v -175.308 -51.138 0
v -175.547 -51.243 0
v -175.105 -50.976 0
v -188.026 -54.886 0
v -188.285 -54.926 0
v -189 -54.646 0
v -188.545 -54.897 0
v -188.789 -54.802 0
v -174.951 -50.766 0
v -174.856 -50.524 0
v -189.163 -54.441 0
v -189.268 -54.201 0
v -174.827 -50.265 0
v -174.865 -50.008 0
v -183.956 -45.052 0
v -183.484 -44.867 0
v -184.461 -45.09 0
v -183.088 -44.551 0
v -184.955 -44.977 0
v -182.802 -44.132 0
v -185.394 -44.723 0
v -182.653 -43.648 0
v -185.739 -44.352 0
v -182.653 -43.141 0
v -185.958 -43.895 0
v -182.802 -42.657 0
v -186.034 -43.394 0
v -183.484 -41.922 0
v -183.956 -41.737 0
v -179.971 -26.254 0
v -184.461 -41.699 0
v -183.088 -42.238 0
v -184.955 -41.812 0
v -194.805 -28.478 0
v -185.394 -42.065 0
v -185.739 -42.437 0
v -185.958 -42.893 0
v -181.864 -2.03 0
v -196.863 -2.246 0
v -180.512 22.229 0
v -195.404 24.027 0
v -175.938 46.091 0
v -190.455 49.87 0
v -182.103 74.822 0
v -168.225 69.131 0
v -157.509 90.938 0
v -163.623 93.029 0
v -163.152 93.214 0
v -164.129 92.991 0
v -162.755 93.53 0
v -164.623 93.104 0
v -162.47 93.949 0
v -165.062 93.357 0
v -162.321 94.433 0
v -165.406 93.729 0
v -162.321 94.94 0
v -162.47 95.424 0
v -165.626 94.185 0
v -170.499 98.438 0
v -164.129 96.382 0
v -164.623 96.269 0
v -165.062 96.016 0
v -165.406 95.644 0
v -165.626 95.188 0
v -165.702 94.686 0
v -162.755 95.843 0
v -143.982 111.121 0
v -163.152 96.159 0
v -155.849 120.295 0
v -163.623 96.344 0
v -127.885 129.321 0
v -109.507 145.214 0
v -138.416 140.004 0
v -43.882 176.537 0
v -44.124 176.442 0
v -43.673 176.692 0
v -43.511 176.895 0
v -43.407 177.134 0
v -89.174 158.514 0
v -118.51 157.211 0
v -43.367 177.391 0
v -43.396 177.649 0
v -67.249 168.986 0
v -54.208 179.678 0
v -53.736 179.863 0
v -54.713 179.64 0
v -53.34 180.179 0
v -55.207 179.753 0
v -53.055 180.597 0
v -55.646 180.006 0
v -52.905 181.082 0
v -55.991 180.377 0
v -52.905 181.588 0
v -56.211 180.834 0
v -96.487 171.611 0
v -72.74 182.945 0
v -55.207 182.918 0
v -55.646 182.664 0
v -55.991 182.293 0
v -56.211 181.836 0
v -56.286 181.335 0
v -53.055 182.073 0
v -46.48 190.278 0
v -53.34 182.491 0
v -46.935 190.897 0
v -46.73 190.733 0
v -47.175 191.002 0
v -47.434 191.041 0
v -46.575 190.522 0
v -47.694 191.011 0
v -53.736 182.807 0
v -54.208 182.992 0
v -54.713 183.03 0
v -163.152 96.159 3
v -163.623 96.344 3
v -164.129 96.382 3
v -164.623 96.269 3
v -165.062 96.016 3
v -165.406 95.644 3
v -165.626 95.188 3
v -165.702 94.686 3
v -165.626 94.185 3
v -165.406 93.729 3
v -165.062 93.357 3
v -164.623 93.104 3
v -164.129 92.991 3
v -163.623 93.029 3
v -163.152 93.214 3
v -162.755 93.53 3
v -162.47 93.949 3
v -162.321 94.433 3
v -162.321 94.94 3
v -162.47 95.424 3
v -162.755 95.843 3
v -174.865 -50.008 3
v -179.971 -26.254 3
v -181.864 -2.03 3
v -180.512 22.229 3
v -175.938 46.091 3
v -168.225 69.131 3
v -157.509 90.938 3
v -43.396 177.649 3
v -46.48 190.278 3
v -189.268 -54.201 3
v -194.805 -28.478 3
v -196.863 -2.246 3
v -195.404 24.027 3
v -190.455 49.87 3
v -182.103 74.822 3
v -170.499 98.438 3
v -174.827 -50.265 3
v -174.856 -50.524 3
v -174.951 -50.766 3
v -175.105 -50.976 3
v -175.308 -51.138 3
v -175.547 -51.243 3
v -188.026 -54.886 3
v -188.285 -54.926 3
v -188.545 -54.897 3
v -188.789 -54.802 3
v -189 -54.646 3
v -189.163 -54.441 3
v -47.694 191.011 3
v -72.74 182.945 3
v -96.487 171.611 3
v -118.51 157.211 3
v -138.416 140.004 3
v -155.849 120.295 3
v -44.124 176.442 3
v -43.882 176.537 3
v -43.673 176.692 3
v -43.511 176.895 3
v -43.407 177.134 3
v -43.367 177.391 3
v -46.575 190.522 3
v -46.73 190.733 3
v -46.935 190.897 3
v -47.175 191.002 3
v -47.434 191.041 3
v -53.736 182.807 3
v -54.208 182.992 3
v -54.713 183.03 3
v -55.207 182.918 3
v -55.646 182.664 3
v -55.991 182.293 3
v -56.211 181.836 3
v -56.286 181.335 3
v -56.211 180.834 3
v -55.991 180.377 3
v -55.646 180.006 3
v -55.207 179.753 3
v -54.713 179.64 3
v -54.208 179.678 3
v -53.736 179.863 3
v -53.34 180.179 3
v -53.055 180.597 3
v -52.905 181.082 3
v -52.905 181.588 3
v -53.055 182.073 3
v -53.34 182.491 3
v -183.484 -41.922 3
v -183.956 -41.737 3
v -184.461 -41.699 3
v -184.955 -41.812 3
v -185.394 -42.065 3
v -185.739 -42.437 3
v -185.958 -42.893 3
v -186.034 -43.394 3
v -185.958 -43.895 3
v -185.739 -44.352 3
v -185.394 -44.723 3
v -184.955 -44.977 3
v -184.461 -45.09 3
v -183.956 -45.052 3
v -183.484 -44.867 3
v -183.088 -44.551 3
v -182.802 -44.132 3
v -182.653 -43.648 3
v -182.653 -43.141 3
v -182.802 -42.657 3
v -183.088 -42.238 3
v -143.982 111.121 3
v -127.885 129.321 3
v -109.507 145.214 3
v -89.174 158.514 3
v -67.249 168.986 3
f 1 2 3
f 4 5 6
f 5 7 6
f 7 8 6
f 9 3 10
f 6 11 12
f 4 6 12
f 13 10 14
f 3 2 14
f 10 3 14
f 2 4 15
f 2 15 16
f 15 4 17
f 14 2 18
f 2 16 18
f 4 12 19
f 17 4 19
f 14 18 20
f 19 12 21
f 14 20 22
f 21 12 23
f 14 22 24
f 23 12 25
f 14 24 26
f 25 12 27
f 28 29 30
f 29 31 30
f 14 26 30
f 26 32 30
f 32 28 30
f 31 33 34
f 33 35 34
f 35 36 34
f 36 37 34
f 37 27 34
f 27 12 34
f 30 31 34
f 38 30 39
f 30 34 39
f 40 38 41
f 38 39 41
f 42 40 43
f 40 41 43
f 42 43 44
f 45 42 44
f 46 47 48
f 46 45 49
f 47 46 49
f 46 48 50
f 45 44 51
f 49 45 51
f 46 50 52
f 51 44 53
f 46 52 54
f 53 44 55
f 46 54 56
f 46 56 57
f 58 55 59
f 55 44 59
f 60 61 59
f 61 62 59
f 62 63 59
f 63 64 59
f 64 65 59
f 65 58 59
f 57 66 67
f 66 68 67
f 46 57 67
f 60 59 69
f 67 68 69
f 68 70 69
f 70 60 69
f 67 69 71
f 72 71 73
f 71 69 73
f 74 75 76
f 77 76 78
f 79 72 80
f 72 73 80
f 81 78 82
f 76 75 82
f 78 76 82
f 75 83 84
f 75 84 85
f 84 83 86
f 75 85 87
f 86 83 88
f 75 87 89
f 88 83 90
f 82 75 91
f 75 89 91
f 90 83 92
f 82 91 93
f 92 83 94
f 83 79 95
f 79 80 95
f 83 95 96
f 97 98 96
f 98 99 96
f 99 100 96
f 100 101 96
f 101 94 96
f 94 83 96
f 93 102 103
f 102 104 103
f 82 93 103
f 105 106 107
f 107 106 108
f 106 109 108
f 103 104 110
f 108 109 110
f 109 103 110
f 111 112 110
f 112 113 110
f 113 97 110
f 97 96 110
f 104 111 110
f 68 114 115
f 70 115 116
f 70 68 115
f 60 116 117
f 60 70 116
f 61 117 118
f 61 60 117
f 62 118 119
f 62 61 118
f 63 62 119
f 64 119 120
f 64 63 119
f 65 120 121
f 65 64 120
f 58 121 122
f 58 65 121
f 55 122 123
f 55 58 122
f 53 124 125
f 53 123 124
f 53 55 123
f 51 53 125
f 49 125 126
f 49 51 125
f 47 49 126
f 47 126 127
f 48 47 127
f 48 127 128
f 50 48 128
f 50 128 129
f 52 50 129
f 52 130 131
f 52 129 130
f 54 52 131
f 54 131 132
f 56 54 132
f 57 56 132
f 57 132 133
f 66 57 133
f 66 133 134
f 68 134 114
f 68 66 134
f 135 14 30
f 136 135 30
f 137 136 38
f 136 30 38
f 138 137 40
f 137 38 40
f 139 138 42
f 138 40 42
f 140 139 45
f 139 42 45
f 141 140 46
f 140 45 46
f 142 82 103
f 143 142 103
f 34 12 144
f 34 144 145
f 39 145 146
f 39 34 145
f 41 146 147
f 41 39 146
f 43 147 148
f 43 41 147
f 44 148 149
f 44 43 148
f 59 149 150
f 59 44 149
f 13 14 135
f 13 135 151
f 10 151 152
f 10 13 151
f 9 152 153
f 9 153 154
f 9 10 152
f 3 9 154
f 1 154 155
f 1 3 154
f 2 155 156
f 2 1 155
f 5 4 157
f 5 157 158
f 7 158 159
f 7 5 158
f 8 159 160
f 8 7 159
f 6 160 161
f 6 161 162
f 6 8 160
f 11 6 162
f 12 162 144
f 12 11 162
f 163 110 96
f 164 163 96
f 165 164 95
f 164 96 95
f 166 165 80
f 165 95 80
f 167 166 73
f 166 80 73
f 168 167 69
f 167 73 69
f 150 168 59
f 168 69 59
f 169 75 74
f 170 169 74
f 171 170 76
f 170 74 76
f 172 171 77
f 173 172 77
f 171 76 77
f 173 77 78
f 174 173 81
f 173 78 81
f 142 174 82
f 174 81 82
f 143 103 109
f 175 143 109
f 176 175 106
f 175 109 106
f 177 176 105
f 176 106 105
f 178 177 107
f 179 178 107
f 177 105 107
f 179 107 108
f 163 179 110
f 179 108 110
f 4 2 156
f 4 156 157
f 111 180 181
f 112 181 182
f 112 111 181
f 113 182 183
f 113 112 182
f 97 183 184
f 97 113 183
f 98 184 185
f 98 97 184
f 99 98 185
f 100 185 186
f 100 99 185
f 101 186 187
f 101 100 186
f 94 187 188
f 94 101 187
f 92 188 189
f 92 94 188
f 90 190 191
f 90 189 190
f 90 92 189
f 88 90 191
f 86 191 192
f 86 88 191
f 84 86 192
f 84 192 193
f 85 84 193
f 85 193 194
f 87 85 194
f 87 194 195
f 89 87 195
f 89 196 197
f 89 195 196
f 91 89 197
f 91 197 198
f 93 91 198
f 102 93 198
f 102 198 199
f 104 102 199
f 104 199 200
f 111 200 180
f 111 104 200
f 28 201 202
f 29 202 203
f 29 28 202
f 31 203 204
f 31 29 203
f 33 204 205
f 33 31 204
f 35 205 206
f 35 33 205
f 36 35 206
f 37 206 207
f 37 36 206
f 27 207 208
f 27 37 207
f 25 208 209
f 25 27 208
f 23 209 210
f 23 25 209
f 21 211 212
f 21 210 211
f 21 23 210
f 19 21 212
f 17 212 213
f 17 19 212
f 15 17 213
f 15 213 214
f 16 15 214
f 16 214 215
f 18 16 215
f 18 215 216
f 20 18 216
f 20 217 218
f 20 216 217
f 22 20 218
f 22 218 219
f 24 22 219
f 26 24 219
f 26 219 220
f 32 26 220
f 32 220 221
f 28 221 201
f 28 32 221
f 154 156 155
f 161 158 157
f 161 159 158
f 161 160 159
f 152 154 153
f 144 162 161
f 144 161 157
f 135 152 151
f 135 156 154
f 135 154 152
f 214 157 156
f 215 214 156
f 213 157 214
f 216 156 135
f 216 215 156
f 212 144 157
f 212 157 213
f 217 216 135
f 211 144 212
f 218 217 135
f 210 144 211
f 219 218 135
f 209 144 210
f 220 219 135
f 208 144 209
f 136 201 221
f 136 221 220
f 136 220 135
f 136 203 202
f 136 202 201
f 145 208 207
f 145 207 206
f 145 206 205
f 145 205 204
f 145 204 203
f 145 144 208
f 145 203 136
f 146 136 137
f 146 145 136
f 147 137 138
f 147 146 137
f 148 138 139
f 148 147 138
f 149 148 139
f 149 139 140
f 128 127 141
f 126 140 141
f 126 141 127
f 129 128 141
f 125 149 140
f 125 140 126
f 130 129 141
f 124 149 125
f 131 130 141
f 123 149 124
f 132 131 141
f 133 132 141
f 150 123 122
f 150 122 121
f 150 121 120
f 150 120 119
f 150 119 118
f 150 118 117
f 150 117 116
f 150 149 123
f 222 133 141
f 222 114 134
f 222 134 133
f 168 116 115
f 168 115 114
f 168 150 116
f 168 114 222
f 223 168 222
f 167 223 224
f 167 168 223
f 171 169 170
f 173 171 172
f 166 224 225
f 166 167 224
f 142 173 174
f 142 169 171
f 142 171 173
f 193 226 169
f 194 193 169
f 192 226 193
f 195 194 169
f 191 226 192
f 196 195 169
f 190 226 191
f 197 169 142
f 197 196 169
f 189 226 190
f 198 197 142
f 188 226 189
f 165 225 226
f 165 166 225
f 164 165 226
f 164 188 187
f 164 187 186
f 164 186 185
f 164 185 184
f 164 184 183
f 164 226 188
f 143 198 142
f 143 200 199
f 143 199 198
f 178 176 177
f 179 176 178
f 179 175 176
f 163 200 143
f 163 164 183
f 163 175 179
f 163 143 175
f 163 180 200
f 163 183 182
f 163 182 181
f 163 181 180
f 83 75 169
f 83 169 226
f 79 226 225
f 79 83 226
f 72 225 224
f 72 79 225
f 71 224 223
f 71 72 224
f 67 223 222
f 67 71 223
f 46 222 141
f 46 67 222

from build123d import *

# Parameters (mm, degrees)
PAD015_DEPTH                        = 3
SKETCH054_R                         = 1.7
POCKET018_DEPTH                     = 0.001
POCKET018_DEPTH_BACK                = 3.001
BODY001003005003004_PLACEMENT_ANGLE = 60


with BuildPart() as part:
    # Sketch053 → Pad015 (new body)
    with BuildSketch(Plane.XY):
        with BuildLine():
            Line((0, 181.875477), (0, 196.875477))
            ThreePointArc((141.573324, 136.809895), (76.894213, 181.238057), (0, 196.875477))
            ThreePointArc((141.545448, 135.39235), (141.85403, 136.095329), (141.573324, 136.809895))
            Line((132.151008, 126.406294), (141.545448, 135.39235))
            ThreePointArc((130.740934, 126.433766), (131.440303, 126.129123), (132.151008, 126.406294))
            ThreePointArc((130.740934, 126.433766), (71.005238, 167.442364), (0, 181.875477))
        make_face()
    pad015 = extrude(amount=PAD015_DEPTH)

    # Mirrored020: Pad015 across Sketch053 V_Axis
    add(pad015.mirror(Plane(origin=(0, 0, 0), x_dir=(0, 0, 1), z_dir=(1, 0, 0))))

    # Sketch054 → Pocket018 (cut, two sides)
    with BuildSketch(Plane.XY) as pocket018_sk:
        with Locations((129.747586, 137.940691)):
            Circle(SKETCH054_R)
        with Locations((0, 189.372834)):
            Circle(SKETCH054_R)
        with Locations((-129.747586, 137.940691)):
            Circle(SKETCH054_R)
    extrude(amount=-POCKET018_DEPTH, mode=Mode.SUBTRACT)
    extrude(pocket018_sk.sketch, amount=POCKET018_DEPTH_BACK, mode=Mode.SUBTRACT)


with BuildPart() as part_1:
    # Body001003005003004 placement: moved
    add(part.part.rotate(Axis((0, 0, 0), (0, 0, 1)), BODY001003005003004_PLACEMENT_ANGLE))


solid = part_1.part
